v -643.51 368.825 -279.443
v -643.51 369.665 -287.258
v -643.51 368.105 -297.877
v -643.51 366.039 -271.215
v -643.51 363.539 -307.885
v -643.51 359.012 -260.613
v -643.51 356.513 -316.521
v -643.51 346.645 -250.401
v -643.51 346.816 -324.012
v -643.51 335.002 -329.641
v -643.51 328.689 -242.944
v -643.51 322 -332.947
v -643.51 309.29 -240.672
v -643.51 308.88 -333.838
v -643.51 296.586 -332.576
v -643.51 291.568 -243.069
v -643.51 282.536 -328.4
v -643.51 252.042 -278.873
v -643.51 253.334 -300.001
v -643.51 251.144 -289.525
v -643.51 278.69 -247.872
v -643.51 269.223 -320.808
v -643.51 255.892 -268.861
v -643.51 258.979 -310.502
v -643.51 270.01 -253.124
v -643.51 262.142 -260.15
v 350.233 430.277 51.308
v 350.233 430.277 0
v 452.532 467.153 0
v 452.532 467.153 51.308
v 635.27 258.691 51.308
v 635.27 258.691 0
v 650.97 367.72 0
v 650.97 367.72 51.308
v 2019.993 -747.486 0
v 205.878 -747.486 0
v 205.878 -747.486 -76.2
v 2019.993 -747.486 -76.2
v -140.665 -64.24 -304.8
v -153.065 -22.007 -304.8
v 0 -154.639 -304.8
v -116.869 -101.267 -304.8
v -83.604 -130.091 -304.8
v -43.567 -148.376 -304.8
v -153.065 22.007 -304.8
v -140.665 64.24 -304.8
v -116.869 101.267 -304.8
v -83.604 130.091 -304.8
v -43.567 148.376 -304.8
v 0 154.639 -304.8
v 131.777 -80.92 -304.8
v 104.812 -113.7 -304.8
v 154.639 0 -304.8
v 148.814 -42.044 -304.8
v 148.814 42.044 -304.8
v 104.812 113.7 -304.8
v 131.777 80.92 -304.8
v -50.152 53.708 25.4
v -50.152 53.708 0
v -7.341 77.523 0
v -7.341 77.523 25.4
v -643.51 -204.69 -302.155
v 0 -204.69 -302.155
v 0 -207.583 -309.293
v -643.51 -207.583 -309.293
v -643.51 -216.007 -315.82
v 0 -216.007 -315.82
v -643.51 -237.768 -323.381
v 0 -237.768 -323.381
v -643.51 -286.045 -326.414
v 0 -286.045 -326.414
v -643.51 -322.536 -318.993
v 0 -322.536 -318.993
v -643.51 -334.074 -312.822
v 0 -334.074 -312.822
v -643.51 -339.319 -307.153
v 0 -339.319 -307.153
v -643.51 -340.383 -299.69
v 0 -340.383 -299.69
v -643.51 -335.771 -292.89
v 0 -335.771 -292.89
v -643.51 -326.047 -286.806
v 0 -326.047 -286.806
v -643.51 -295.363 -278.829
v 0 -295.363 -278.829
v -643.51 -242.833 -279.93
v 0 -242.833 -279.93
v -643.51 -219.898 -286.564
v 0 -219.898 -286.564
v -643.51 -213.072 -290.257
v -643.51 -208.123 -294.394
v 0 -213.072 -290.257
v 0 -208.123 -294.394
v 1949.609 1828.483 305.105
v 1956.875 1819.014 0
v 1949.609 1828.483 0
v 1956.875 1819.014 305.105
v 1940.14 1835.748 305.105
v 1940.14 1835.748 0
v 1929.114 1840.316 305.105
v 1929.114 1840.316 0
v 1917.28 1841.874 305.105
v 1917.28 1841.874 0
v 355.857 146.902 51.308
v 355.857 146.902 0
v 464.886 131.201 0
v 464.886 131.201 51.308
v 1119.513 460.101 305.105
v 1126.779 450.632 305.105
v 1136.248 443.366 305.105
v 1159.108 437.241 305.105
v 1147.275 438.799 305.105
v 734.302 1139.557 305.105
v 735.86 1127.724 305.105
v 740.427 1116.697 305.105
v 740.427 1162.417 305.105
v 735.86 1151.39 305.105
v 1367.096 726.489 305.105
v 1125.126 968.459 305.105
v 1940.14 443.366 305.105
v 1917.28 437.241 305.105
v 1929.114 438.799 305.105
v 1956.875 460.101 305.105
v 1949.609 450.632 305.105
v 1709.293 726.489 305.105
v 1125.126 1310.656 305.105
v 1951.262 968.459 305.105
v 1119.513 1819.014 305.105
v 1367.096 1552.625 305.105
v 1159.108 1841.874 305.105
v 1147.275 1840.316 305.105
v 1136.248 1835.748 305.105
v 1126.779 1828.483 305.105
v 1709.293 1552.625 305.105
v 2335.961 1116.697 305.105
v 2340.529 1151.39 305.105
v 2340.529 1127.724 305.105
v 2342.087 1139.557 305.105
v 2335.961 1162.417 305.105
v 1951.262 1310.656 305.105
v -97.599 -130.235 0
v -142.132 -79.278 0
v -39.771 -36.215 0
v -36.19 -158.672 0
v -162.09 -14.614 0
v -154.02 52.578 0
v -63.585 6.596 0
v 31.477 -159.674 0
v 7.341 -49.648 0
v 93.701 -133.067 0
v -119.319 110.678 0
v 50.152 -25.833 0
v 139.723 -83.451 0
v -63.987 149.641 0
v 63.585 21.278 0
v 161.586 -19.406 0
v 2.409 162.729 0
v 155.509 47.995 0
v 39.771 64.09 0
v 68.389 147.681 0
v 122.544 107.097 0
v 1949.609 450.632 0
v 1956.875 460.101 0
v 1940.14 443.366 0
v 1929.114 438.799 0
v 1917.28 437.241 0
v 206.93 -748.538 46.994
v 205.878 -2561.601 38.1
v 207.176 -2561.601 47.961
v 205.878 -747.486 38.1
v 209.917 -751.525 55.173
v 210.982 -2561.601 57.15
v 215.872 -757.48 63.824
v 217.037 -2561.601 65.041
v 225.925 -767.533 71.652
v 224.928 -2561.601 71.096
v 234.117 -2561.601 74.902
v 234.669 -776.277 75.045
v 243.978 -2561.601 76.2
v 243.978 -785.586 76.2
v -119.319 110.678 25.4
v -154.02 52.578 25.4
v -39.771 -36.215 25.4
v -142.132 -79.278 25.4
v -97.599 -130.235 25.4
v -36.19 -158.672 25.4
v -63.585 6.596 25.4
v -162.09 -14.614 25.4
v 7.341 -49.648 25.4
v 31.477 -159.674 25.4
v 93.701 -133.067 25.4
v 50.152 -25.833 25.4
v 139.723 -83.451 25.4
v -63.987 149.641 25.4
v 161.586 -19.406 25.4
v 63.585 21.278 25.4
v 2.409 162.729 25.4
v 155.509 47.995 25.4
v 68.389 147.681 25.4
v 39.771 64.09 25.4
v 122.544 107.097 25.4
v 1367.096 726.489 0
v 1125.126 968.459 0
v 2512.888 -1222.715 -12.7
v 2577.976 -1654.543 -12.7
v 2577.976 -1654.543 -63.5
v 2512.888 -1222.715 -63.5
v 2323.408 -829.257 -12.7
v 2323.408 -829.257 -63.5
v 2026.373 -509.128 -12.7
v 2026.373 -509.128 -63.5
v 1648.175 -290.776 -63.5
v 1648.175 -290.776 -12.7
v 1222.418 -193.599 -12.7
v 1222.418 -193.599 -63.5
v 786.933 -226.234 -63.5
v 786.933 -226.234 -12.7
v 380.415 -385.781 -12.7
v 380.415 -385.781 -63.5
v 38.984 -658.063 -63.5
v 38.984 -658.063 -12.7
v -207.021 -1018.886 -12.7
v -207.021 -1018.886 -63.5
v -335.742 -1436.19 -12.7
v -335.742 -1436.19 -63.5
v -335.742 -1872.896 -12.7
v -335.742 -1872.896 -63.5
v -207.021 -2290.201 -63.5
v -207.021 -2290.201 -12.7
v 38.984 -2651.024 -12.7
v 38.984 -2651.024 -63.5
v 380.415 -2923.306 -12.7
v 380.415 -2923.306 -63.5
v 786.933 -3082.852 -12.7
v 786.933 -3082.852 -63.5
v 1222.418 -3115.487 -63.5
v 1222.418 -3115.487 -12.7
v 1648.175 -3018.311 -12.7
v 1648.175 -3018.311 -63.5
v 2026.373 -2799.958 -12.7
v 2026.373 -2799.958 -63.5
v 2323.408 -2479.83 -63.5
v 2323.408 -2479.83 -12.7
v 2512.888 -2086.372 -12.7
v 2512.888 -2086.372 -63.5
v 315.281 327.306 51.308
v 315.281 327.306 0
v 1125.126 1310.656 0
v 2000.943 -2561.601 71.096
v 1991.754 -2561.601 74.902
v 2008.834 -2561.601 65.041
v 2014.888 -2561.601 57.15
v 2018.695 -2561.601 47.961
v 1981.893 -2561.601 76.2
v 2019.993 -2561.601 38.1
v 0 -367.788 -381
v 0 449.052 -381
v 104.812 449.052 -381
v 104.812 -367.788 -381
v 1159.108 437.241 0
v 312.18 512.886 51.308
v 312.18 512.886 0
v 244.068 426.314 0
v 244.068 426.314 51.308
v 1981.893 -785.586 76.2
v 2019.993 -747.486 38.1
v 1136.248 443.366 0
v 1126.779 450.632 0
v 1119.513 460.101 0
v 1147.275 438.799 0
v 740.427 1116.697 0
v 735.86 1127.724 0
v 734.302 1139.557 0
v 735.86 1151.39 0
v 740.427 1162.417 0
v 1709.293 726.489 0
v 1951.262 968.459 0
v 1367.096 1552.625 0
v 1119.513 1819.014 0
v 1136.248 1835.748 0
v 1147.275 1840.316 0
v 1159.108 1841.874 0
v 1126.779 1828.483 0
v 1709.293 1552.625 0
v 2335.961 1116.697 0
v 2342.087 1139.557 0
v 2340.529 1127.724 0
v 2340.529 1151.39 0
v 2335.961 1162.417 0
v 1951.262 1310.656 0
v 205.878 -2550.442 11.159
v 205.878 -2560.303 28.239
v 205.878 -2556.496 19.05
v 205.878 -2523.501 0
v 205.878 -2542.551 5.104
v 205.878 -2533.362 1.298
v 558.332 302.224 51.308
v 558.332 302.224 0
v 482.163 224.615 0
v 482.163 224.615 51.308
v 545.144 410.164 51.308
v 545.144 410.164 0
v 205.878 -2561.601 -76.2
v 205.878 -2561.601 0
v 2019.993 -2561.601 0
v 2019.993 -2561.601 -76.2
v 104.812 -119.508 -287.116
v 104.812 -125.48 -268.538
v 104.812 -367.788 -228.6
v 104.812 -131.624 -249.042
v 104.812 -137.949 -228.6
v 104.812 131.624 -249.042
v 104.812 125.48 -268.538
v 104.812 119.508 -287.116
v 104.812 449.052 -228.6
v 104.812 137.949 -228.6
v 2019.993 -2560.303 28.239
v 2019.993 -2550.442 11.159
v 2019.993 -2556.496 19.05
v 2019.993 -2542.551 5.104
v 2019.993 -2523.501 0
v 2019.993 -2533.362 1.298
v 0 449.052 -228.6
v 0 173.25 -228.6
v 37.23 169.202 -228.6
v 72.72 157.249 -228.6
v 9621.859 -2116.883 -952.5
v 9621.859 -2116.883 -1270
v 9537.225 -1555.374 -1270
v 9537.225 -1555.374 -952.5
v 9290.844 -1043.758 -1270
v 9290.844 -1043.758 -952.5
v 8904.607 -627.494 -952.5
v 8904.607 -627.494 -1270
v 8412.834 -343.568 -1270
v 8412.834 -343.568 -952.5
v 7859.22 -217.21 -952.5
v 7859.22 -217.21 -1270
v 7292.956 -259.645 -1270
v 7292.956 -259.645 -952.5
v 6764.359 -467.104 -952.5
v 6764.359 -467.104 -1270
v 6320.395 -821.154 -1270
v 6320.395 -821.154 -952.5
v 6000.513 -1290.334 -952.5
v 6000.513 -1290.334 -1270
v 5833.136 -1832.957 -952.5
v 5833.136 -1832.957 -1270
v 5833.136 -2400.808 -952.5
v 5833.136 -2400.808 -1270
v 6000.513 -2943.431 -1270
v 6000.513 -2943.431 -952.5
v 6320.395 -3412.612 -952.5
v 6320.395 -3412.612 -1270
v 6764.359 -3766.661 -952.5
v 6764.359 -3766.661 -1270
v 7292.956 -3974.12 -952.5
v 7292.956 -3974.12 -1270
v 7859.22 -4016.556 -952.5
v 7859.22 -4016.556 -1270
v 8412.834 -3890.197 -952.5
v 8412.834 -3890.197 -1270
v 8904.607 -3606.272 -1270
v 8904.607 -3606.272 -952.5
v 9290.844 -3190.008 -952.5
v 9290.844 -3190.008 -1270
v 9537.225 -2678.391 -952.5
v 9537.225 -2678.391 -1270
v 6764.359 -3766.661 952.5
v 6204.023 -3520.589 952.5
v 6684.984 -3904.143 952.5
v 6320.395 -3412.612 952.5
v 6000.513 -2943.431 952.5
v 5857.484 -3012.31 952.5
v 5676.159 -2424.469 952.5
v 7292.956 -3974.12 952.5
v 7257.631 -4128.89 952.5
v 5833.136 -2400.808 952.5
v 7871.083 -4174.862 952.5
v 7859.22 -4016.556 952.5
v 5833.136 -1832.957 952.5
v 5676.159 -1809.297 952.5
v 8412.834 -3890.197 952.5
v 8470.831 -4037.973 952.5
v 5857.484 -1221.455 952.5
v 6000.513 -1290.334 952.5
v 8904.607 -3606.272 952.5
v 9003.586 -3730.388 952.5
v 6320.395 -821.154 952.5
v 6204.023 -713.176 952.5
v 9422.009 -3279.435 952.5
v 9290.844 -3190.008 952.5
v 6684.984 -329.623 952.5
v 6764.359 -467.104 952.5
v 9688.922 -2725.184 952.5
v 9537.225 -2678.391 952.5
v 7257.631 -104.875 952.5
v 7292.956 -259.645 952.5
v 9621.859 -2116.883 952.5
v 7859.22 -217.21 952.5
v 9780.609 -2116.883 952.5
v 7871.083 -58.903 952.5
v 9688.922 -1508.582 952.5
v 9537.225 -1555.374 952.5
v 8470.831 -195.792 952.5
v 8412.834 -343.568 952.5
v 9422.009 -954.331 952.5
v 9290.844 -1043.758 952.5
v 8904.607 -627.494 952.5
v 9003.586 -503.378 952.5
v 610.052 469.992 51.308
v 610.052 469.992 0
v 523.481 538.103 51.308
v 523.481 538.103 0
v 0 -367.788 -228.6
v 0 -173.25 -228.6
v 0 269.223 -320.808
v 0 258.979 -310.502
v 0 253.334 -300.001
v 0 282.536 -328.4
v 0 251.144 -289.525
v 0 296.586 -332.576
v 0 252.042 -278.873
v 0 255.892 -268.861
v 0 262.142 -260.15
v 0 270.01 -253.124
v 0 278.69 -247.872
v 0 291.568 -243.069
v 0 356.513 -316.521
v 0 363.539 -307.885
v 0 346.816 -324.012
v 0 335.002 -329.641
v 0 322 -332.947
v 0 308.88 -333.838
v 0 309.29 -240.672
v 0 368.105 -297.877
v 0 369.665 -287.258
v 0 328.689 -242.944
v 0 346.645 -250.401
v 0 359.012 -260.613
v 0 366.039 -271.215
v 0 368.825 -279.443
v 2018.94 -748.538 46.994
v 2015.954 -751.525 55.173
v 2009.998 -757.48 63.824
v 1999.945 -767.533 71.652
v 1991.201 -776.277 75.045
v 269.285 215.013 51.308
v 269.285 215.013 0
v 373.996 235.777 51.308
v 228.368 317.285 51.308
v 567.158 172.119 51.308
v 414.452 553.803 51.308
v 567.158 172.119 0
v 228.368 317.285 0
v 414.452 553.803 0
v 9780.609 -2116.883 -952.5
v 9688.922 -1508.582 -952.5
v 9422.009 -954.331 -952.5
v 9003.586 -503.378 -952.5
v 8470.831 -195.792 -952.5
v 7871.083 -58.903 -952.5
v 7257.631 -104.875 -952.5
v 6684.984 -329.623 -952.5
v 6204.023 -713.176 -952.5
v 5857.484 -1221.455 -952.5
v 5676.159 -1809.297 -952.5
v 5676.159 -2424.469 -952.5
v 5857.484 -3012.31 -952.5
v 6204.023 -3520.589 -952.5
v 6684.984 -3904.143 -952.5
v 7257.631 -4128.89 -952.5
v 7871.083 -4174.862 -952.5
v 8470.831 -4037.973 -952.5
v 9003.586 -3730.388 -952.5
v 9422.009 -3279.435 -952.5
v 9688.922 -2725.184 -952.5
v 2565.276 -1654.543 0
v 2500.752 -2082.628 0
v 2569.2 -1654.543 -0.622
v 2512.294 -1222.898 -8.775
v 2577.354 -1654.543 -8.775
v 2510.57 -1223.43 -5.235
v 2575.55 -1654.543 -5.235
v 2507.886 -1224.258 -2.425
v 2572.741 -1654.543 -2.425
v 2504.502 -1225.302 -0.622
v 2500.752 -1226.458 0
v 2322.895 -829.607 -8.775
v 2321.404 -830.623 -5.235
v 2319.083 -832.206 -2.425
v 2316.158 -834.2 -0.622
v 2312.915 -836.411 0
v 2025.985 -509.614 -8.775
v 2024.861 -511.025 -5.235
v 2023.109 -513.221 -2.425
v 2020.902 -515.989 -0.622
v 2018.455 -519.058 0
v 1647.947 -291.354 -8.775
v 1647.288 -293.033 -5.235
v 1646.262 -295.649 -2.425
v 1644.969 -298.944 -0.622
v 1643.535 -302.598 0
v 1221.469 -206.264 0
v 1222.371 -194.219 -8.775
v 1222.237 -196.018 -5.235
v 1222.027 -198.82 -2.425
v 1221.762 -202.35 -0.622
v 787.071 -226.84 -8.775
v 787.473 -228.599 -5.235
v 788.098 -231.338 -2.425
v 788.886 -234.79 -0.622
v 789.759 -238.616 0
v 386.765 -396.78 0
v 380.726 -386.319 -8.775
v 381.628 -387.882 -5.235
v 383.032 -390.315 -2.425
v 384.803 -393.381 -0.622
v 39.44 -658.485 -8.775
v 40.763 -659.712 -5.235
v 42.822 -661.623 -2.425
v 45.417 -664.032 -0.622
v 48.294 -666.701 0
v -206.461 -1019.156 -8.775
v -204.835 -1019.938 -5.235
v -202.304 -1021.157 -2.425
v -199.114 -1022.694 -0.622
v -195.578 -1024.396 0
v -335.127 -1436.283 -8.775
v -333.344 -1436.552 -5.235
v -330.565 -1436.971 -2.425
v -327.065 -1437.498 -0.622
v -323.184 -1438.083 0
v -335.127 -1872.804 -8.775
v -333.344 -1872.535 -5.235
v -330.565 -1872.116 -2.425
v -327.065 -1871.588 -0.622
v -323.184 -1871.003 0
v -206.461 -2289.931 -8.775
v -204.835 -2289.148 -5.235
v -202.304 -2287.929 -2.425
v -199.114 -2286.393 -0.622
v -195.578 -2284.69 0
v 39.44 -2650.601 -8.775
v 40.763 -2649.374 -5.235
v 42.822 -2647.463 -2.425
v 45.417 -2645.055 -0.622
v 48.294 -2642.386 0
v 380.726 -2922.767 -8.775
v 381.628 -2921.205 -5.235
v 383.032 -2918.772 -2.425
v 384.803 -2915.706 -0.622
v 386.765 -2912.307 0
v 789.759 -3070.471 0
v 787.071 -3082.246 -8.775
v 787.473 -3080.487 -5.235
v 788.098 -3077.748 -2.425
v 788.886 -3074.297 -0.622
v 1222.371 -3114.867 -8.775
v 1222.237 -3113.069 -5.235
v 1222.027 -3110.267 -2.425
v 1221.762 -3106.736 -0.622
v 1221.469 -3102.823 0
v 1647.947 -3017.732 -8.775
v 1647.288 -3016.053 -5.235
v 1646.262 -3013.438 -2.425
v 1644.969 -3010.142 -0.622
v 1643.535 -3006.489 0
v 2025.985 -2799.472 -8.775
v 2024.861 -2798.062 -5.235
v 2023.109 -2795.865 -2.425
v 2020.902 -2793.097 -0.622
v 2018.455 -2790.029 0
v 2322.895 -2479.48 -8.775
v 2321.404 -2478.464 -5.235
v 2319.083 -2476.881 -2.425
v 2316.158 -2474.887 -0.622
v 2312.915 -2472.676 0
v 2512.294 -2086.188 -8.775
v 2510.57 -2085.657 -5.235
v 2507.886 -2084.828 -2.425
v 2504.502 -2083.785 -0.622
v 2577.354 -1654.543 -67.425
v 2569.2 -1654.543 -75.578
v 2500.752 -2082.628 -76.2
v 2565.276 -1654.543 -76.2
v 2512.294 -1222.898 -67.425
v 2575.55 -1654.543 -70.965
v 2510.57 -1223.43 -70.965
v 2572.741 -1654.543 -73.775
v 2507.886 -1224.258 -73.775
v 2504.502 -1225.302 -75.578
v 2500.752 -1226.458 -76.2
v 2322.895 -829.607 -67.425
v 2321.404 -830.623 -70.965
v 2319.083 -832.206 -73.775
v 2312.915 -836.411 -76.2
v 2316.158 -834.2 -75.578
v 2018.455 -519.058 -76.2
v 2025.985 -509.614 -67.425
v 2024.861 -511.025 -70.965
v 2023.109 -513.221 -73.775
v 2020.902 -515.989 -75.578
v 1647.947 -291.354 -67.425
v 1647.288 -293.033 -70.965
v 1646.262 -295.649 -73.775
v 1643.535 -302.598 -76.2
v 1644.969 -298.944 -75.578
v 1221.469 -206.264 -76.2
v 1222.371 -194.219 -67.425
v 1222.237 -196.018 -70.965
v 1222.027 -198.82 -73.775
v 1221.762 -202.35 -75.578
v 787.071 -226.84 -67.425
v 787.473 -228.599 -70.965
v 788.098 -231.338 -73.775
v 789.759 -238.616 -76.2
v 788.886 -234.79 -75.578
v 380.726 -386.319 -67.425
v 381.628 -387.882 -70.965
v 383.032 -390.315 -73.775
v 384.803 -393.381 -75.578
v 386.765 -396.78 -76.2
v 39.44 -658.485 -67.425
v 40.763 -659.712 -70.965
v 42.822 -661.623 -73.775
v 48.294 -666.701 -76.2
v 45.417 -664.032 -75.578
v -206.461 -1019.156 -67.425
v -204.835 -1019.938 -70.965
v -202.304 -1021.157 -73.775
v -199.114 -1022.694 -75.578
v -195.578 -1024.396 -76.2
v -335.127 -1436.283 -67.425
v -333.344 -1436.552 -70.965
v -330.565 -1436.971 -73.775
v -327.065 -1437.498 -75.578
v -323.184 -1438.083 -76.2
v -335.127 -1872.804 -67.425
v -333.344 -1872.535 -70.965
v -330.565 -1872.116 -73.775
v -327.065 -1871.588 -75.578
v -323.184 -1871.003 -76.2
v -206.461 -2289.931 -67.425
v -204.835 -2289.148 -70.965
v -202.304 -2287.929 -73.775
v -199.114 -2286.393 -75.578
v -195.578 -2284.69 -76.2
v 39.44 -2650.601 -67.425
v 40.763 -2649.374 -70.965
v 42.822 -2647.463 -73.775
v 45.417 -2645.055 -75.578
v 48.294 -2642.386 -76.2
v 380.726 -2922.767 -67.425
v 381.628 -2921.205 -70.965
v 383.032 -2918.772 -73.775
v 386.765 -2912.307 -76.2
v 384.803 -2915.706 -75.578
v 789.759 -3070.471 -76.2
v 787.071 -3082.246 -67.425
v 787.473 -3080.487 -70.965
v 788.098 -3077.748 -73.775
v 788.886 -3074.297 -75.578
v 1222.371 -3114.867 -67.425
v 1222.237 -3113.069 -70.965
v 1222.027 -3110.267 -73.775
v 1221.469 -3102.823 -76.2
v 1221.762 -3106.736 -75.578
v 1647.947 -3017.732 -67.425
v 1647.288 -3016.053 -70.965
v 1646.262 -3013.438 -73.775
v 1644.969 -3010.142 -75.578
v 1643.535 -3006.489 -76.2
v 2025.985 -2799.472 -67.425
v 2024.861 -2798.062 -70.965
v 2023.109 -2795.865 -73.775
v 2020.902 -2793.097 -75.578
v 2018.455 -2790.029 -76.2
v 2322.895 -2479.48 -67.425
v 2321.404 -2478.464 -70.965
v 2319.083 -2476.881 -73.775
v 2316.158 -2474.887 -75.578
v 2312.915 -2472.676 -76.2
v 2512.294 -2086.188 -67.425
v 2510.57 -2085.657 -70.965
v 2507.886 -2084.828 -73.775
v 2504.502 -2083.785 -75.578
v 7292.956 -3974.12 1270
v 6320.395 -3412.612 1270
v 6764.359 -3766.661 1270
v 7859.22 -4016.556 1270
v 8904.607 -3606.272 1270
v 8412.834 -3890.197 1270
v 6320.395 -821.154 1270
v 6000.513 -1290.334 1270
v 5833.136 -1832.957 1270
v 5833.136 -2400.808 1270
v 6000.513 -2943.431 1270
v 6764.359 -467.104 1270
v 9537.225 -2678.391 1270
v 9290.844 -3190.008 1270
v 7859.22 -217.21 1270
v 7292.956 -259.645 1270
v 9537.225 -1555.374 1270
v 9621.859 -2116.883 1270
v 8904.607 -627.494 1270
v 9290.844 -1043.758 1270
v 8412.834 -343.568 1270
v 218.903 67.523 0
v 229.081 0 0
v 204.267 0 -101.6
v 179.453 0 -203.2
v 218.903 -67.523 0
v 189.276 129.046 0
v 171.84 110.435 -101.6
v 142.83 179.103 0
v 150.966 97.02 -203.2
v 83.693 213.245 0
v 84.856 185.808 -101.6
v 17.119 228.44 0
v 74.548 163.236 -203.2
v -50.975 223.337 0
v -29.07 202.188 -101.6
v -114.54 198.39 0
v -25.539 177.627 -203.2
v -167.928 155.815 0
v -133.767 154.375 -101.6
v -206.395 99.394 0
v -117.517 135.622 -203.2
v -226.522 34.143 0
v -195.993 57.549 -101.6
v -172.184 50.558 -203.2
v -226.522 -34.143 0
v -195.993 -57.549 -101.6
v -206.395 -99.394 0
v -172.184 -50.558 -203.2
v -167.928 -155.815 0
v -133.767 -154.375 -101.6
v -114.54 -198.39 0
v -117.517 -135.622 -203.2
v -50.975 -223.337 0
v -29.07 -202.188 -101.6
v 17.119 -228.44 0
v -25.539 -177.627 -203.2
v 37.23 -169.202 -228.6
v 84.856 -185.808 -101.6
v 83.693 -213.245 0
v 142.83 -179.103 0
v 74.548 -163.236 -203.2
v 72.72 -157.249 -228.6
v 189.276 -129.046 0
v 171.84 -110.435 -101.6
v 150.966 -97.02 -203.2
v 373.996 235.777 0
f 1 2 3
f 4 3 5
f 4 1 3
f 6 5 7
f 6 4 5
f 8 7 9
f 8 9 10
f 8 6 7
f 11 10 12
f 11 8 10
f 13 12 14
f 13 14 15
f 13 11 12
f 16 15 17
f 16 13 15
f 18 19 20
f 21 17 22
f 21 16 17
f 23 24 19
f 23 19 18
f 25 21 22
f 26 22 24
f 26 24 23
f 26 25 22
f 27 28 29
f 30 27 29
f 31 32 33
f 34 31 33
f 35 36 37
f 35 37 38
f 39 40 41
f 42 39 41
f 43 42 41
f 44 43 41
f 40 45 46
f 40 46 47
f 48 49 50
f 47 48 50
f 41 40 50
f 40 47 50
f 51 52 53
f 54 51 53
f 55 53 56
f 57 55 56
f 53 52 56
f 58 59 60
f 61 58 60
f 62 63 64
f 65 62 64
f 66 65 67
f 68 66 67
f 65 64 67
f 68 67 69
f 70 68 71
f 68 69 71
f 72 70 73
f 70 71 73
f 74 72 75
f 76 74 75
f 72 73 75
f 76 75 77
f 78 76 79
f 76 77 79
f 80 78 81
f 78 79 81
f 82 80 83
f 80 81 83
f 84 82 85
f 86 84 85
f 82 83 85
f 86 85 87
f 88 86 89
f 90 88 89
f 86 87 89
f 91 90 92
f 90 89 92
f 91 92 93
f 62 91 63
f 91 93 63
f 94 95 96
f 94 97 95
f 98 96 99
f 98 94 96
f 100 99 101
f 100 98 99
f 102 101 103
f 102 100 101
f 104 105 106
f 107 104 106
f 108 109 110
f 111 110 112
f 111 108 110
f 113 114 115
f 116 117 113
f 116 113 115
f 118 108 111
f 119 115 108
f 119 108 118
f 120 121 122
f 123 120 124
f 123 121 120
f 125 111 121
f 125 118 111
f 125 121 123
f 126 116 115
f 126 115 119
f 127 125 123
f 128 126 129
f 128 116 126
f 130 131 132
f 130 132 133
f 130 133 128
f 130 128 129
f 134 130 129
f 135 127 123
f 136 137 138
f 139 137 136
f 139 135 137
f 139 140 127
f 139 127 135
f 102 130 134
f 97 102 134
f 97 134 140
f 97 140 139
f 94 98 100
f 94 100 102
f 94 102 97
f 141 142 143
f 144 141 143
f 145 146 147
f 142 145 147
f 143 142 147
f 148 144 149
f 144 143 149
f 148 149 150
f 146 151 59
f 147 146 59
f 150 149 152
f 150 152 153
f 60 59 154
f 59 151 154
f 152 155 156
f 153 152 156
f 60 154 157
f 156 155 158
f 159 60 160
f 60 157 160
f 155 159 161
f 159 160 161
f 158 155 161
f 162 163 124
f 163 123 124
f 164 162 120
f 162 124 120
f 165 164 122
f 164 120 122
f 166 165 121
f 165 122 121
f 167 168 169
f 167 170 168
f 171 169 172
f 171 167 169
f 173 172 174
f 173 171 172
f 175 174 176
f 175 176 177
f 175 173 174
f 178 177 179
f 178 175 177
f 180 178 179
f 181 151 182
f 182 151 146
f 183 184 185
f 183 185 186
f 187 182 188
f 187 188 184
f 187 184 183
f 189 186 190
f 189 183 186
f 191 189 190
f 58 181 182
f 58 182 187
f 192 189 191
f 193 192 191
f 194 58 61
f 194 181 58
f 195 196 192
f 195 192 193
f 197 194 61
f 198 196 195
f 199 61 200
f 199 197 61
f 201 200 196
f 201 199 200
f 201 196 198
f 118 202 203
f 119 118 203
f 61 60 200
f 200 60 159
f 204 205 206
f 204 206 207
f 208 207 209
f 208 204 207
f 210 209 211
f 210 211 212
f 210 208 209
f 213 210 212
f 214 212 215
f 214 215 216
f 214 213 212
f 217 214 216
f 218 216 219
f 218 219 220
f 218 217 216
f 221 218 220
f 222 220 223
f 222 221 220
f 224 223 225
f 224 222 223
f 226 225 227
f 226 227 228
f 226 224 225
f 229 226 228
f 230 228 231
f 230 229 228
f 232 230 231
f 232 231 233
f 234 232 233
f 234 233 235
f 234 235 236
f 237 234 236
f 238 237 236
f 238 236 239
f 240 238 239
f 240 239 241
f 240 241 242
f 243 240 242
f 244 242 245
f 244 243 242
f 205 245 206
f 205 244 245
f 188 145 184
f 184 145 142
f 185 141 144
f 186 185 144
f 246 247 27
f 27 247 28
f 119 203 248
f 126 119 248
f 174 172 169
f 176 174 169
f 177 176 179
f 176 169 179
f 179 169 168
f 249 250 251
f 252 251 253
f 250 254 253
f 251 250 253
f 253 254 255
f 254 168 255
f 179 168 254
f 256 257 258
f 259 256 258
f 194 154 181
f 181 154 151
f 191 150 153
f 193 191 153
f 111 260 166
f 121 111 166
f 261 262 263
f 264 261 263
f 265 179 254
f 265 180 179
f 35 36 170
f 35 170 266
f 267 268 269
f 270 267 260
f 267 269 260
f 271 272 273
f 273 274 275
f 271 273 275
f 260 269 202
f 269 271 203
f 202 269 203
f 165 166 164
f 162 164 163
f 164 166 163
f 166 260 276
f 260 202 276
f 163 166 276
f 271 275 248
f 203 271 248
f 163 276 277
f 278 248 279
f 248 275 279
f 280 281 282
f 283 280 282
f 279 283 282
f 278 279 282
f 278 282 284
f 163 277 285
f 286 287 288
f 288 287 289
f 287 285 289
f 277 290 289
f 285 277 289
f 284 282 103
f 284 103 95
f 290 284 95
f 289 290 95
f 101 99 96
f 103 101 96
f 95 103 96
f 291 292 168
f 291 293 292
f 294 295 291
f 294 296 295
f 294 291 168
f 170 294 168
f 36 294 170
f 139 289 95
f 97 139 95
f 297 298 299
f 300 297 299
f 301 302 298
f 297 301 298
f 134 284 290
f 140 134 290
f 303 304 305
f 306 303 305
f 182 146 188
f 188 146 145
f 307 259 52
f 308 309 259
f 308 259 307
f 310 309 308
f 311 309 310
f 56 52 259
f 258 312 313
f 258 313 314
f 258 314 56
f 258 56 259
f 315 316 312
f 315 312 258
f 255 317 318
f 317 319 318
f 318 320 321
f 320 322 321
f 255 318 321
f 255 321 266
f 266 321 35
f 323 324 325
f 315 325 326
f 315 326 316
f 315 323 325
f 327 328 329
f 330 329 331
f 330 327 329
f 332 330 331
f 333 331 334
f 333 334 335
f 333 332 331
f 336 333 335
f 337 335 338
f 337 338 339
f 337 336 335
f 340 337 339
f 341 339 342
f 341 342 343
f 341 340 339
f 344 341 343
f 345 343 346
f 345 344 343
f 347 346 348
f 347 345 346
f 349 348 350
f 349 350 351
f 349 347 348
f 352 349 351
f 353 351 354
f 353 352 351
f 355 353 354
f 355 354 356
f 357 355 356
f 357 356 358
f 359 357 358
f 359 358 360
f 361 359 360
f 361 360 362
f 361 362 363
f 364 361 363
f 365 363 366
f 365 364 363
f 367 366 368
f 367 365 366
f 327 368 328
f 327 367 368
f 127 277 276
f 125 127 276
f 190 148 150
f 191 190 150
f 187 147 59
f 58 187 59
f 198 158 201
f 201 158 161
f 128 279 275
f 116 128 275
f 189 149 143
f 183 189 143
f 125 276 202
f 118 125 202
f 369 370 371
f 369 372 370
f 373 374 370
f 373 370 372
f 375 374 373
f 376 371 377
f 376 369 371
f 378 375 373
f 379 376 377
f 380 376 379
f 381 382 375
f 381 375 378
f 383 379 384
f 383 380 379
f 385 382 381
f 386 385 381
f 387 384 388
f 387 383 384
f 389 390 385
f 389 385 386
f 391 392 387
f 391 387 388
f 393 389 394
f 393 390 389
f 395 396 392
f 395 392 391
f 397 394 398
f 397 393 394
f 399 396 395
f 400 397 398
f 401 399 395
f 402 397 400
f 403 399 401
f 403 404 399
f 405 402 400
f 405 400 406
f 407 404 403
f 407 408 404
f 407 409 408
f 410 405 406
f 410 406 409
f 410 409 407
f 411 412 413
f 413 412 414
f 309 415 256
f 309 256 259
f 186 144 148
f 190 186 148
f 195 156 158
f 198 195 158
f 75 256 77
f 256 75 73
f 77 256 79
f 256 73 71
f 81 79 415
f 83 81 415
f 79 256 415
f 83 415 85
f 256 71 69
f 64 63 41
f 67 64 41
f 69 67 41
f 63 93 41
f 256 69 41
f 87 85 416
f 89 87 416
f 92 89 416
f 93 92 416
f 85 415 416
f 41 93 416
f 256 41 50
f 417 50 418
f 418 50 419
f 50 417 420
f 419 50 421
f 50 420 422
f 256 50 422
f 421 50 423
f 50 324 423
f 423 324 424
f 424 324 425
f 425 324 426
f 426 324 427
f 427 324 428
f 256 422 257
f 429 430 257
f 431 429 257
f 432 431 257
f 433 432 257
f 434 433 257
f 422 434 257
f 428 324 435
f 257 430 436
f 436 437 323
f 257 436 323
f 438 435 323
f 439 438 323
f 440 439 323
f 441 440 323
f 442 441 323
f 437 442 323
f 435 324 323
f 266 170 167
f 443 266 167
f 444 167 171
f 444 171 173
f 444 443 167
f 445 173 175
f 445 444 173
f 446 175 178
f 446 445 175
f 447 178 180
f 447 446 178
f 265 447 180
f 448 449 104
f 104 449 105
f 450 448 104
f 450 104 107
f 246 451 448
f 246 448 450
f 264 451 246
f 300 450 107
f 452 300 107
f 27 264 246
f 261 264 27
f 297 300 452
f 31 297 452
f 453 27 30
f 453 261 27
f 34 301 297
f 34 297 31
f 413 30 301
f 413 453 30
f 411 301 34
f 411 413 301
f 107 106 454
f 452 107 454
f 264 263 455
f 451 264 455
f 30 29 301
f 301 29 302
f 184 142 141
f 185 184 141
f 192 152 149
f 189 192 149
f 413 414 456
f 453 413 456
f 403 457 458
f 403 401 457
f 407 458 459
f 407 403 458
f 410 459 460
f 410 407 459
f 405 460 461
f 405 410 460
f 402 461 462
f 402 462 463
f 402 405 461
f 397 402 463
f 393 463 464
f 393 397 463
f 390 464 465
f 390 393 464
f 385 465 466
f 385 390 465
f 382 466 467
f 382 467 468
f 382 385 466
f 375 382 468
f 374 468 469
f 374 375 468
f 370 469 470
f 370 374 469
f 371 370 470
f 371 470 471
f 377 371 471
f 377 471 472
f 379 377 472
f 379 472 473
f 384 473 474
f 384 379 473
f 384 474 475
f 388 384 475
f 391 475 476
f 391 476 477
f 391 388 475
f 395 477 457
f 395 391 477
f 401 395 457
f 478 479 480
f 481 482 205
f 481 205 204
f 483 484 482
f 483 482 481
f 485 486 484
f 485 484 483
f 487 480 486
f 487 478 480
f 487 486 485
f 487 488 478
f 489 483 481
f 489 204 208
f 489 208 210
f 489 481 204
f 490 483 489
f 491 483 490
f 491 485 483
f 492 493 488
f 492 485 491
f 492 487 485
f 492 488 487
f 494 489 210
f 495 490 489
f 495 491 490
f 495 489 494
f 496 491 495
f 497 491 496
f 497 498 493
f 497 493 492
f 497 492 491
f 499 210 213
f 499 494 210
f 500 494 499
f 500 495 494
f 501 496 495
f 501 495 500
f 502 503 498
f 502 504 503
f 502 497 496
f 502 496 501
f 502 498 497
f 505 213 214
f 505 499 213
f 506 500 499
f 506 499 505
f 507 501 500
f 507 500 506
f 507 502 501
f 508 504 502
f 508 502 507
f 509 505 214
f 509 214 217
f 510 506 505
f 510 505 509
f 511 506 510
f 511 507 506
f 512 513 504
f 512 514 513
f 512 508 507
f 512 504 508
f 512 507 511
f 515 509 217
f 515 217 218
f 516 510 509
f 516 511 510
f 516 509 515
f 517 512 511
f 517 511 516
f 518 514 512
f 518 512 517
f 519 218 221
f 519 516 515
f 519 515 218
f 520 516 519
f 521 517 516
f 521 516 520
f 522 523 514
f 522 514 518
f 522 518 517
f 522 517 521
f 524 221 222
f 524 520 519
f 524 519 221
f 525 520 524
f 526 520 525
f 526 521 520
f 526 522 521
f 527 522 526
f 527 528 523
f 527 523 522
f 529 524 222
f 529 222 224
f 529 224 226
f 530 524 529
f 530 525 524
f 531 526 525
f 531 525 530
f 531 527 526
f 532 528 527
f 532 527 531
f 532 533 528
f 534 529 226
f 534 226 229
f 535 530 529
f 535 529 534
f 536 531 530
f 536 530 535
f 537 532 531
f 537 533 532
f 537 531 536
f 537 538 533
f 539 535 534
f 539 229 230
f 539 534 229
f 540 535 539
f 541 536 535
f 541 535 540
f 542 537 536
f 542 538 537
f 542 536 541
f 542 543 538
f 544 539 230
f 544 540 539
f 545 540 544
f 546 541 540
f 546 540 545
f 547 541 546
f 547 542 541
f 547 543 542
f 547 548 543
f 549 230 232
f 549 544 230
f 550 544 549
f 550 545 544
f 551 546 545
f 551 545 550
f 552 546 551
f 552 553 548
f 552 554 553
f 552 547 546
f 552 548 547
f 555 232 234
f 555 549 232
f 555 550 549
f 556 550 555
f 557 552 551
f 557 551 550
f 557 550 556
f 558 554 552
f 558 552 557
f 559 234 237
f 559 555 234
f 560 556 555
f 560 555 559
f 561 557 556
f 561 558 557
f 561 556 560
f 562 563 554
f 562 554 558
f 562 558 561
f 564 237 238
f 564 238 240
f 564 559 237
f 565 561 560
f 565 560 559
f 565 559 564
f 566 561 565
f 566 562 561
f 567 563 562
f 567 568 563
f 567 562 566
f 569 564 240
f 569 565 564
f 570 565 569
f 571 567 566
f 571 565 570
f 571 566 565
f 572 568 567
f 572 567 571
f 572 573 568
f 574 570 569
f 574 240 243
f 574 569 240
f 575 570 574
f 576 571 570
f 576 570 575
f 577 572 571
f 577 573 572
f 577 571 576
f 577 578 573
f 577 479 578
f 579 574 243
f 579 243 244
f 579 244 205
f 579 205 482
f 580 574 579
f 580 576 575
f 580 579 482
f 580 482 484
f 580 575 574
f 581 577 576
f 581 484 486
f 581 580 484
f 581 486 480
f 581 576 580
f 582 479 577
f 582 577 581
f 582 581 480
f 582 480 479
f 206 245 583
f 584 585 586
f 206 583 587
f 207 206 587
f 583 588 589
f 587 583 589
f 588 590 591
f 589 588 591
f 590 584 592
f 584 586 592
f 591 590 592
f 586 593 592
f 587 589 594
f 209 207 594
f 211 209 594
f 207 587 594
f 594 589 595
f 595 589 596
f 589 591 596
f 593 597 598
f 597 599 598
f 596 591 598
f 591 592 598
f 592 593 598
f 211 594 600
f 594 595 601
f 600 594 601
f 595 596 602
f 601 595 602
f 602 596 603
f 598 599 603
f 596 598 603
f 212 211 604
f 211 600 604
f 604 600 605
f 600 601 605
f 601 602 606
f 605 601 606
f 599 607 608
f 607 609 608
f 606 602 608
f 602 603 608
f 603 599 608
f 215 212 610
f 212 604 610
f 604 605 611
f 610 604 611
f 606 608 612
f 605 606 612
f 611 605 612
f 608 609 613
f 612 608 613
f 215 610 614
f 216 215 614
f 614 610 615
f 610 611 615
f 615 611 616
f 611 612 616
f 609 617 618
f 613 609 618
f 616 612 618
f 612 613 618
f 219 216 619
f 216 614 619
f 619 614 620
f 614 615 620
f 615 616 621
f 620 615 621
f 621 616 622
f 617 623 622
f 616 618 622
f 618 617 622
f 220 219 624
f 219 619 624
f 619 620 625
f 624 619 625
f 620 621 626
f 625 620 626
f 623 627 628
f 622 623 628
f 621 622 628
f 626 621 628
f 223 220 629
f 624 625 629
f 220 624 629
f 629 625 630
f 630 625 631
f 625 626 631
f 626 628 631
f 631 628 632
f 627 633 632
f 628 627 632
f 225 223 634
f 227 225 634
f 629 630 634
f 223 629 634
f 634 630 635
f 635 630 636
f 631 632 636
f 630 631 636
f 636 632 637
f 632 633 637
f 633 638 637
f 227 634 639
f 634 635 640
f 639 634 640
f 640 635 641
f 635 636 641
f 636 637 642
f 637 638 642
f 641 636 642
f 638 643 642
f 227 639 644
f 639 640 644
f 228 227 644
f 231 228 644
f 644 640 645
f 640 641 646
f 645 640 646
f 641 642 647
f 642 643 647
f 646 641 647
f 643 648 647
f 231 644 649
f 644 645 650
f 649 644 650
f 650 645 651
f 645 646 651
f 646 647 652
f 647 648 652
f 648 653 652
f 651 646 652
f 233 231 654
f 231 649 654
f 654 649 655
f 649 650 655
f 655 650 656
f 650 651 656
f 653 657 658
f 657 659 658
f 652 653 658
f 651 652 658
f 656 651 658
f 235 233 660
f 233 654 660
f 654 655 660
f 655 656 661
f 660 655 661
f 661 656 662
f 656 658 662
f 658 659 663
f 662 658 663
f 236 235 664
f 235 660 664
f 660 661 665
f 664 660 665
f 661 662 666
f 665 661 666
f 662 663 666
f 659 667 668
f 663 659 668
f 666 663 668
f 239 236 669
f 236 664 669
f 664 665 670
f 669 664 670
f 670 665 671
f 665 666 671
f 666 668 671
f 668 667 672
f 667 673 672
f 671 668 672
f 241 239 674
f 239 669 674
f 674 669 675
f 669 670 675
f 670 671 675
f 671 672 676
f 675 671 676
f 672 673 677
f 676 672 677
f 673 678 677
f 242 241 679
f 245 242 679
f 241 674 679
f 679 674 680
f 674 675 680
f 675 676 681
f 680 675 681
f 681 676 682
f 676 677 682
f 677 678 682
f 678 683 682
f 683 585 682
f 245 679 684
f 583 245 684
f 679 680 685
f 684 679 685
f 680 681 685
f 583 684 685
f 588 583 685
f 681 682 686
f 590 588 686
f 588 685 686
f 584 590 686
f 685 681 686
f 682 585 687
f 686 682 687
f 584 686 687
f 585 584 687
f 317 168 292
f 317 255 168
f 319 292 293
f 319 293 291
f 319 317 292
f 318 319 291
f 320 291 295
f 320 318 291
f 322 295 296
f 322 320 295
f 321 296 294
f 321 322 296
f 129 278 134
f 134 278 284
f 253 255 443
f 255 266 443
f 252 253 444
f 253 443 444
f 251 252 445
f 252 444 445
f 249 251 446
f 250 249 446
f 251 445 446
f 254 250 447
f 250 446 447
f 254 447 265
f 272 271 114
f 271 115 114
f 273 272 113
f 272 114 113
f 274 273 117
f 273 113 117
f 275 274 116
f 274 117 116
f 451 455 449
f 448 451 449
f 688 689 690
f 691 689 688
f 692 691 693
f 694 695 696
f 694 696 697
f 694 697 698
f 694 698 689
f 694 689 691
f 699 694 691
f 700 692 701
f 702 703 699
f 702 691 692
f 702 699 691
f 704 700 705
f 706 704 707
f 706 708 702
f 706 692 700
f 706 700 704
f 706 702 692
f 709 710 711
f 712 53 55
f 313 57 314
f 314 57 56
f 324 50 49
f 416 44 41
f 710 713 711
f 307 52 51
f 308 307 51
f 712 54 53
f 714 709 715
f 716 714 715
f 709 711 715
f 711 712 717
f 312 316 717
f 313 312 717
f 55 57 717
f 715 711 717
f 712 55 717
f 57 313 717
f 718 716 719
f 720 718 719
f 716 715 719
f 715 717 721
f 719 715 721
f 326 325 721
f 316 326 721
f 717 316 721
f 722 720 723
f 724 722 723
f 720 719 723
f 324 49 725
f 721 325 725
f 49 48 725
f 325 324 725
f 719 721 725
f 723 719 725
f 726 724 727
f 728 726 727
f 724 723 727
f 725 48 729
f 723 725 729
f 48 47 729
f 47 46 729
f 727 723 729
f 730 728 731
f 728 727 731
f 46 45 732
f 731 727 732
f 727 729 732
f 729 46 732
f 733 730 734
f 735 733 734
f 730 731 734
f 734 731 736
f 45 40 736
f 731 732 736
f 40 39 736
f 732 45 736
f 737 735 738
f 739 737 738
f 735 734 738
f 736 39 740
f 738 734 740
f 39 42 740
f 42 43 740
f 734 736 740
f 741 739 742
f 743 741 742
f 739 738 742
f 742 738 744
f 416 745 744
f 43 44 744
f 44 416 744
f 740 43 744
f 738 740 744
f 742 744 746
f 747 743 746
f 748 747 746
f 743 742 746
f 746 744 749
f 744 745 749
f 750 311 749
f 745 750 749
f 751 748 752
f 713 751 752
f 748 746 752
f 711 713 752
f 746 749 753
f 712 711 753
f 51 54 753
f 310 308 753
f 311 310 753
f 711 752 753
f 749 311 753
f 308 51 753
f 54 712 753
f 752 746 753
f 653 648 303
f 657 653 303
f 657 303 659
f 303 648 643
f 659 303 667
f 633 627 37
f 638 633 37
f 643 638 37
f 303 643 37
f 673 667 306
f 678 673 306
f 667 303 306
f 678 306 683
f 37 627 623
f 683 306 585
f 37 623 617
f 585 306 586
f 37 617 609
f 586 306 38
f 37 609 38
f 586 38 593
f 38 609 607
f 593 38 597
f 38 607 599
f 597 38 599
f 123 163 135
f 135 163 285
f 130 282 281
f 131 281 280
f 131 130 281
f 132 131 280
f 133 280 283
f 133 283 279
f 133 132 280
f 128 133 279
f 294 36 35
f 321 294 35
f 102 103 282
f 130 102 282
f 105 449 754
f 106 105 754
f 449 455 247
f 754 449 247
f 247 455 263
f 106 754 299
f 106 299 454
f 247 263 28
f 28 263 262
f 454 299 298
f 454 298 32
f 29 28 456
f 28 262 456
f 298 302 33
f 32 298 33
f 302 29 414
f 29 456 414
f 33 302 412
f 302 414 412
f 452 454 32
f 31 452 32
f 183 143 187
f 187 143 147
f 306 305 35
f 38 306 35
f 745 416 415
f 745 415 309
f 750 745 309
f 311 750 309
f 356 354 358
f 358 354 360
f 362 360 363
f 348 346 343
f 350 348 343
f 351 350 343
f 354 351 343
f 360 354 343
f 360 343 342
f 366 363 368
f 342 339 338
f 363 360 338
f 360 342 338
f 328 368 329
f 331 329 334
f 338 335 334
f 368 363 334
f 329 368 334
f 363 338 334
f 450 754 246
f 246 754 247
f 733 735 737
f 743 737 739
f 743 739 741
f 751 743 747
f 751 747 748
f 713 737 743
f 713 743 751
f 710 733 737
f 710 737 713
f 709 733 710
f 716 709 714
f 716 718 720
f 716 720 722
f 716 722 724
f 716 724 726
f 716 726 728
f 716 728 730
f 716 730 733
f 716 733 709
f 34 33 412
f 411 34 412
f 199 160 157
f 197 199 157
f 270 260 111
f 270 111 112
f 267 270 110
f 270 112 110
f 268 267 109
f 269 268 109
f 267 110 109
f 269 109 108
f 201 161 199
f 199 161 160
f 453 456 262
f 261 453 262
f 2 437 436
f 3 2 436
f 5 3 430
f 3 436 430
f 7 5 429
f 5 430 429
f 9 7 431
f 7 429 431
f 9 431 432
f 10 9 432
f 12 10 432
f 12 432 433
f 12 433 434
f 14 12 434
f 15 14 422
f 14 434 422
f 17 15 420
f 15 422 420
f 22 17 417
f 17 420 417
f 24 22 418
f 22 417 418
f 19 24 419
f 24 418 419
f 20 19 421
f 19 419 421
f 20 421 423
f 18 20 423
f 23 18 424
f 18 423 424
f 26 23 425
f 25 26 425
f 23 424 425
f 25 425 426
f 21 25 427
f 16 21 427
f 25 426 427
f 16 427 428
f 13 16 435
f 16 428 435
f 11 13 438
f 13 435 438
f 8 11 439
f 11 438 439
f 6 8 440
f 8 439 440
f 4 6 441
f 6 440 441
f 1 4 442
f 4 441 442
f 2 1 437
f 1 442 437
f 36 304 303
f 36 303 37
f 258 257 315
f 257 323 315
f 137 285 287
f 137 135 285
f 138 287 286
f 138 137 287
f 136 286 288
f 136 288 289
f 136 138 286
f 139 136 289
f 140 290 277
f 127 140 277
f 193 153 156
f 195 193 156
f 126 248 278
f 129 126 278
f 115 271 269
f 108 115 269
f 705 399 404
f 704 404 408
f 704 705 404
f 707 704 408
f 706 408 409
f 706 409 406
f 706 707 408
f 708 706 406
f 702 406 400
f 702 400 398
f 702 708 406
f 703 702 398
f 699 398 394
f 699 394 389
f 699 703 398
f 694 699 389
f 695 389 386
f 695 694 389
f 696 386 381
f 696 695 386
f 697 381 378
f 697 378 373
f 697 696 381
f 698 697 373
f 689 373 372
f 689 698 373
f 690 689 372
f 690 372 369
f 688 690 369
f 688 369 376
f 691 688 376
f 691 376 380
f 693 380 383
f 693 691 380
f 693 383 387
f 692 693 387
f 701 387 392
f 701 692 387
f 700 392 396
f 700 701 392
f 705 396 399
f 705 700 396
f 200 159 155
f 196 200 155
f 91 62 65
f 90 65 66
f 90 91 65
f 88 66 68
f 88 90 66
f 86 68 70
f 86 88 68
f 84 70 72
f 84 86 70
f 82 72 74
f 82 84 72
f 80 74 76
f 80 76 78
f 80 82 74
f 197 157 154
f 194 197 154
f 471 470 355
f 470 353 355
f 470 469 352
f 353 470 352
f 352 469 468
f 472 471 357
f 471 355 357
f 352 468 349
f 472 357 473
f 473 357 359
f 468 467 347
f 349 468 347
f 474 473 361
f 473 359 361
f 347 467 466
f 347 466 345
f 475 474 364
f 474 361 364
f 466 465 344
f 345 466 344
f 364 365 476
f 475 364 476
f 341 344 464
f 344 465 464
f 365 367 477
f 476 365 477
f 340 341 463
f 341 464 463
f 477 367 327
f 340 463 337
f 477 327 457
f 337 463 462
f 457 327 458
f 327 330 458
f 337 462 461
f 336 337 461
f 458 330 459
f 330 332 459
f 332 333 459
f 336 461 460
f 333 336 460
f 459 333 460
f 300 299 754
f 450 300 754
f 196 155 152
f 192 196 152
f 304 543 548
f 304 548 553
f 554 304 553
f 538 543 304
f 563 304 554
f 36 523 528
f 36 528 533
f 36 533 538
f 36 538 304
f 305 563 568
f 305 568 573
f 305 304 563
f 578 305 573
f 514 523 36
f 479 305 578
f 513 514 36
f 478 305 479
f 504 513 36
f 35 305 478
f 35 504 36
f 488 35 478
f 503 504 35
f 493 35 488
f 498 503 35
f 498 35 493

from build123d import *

# Parameters (mm, degrees)
F1_DEPTH  = 25.4
F3_DEPTH  = 51.308
F5_DEPTH  = 305.1048
F6_R      = 45.72
F7_R      = 1465.0405111475
F7_W      = 1814.1152858734
F7_H      = 1814.1152858734
F8_DEPTH  = 76.2
F9_DEPTH  = 76.2
F10_R     = 38.09999
F11_R     = 12.7
F12_R     = 1905
F13_DEPTH = 1270
F12_R_2   = 2063.75
F14_DEPTH = 952.5
F19_R     = 229.0809109199
F21_R     = 154.6394893279
F23_W     = 104.8123165965
F23_H     = 816.8393224478
F24_DEPTH = 76.2
F26_DEPTH = 643.5099393129


# Not quite as in the source:
# - a fillet or chamfer is up to 0.001 mm smaller than in the source, because OpenCascade refuses the exact size
# - the program builds the solid bodies; features that only make, move or delete a surface that nothing else refers to are left out


with BuildPart() as f1:
    # F0 (on Top) → F1 (new body)
    with BuildSketch(Plane.XY):
        Polygon((155.50936864, 47.9948012801), (122.5436329842, 107.0967912674), (68.3889899114, 147.6807731007), (2.4092691885, 162.7294076272), (-63.9870360646, 149.6406492247), (-119.3194014782, 110.6776631286), (-154.0203583934, 52.5775036026), (-162.0897961115, -14.6137839479), (-142.1324355422, -79.2782154918), (-97.5990856351, -130.2347233572), (-36.1899671618, -158.6724644088), (31.4767254093, -159.67429487), (93.7008062, -133.0669891528), (139.7231663537, -83.4511921354), (161.5861216997, -19.4059258675), align=None)
        Polygon((39.7706934855, 64.0896567419), (63.5851919651, 21.2782472372), (50.1523473576, -25.8333841012), (7.3409378529, -49.6478825808), (-39.7706934855, -36.2150379733), (-63.5851919651, 6.5963715315), (-50.1523473576, 53.7080028699), (-7.3409378529, 77.5225013494), align=None, mode=Mode.SUBTRACT)
    extrude(amount=F1_DEPTH)


with BuildPart() as f3:
    # F2 (on Top) → F3 (new body)
    with BuildSketch(Plane.XY):
        Polygon((567.1581641405, 172.1189159194), (635.2695226669, 258.6906254292), (650.9698346822, 367.7196043769), (610.052214261, 469.9916259019), (523.4805047512, 538.1029844284), (414.4515258035, 553.8032964437), (312.1795042784, 512.8856760224), (244.068145752, 426.3139665127), (228.3678337366, 317.284987565), (269.2854541579, 215.0129660399), (355.8571636677, 146.9016075134), (464.8861426154, 131.2012954981), align=None)
        Polygon((545.1443835194, 410.1638138472), (558.3316683769, 302.2244572639), (482.1634188256, 224.6151347452), (373.9958803268, 235.7772490893), (315.2814155857, 327.3055005294), (350.2332141092, 430.2772488952), (452.5318587224, 467.1526674262), align=None, mode=Mode.SUBTRACT)
    extrude(amount=F3_DEPTH)


with BuildPart() as f5:
    # F4 (on Top) → F5 (new body)
    with BuildSketch(Plane.XY):
        Polygon((1943.6769121667, 437.2407213386), (2349.1595144473, 1139.5571900737), (1943.6769121667, 1841.8736588088), (1132.7117076057, 1841.8736588088), (727.2291053252, 1139.5571900737), (1132.7117076057, 437.2407213386), align=None)
        Polygon((1709.2926557119, 1552.6251370658), (1951.2622568783, 1310.6555358994), (1951.2622568783, 968.458844248), (1709.2926557119, 726.4892430816), (1367.0959640605, 726.4892430816), (1125.1263628941, 968.458844248), (1125.1263628941, 1310.6555358994), (1367.0959640605, 1552.6251370658), align=None, mode=Mode.SUBTRACT)
    extrude(amount=F5_DEPTH)

    # F6
    f6_edges = [f5.edges().sort_by_distance(p)[0] for p in [
        (1943.676912, 437.240721, 152.5524),
        (2349.159514, 1139.55719, 152.5524),
        (1943.676912, 1841.873659, 152.5524),
        (1132.711708, 1841.873659, 152.5524),
        (727.229105, 1139.55719, 152.5524),
        (1132.711708, 437.240721, 152.5524),
    ]]
    fillet(f6_edges, radius=F6_R)


with BuildPart() as f8:
    # F7 (on Top) → F8 (new body)
    with BuildSketch(Plane.XY):
        with Locations((1112.9351854324, -1654.5432806015)):
            Circle(F7_R)
        with Locations((1112.9351854324, -1654.5432806015)):
            Rectangle(F7_W, F7_H, mode=Mode.SUBTRACT)
    extrude(amount=-F8_DEPTH)

    # F11
    f11_edges = [f8.edges().sort_by_distance(p)[0] for p in [
        (-352.105326, -1654.543281, 0),
        (-352.105326, -1654.543281, -76.2),
    ]]
    fillet(f11_edges, radius=F11_R)


with BuildPart() as f9:
    # F7 (on Top) → F9 (new body)
    with BuildSketch(Plane.XY):
        with Locations((1112.9351854324, -1654.5432806015)):
            Rectangle(F7_W, F7_H)
    extrude(amount=F9_DEPTH)

    # F10 (radius 38.1 in the source; OpenCascade refuses exactly that, so slightly less here)
    f10_edges = [f9.edges().sort_by_distance(p)[0] for p in [
        (205.877542, -1654.543281, 76.2),
        (2019.992828, -1654.543281, 76.2),
        (1112.935185, -2561.600924, 0),
        (1112.935185, -747.485638, 76.2),
    ]]
    fillet(f10_edges, radius=F10_R)


with BuildPart() as f13:
    # F12 (on Top) → F13 (new body, symmetric)
    with BuildSketch(Plane.XY):
        with Locations((7716.8588638306, -2116.8828010559)):
            Circle(F12_R)
    extrude(amount=F13_DEPTH, both=True)

    # F12 (on Top) → F14 (join, symmetric)
    with BuildSketch(Plane.XY):
        with Locations((7716.8588638306, -2116.8828010559)):
            Circle(F12_R_2)
        with Locations((7716.8588638306, -2116.8828010559)):
            Circle(F12_R, mode=Mode.SUBTRACT)
    extrude(amount=F14_DEPTH, both=True)


with BuildPart() as f22:
    # F19 (on Top) → F22 section 0
    with BuildSketch(Plane.XY):
        Circle(F19_R)
    # F21 (on offset) → F22 section 1
    with BuildSketch(Plane.XY.offset(-304.8)):
        Circle(F21_R)
    loft()

    # F23 (on offset) → F24 (join, symmetric)
    with BuildSketch(Plane.XY.offset(-304.8)):
        with Locations((52.4061582983, 40.6319275498)):
            Rectangle(F23_W, F23_H)
    extrude(amount=F24_DEPTH, both=True)

    # F25 (on face) → F26 (join)
    with BuildSketch(Plane(origin=(0, 0, 0), x_dir=(0, -1, 0), z_dir=(-1, 0, 0))):
        with BuildLine():
            add(Edge.make_bspline(
                [(204.6898007393, -302.1550476551), (204.6898007393, -345.0046976312), (306.7133426666, -323.5798726431), (408.736884594, -302.1550476551), (306.7133426666, -280.7302226671), (204.6898007393, -259.305397679), (204.6898007393, -302.1550476551)],
                knots=[0, 0, 0, 2.0943951024, 2.0943951024, 4.1887902048, 4.1887902048, 6.2831853072, 6.2831853072, 6.2831853072], degree=2, weights=[1, 0.5, 1, 0.5, 1, 0.5, 1]))
        make_face()
        with BuildLine():
            add(Edge.make_bspline(
                [(-369.6652650833, -287.2584462166), (-369.6652650833, -367.9612465382), (-280.7216048241, -327.6098463774), (-191.7779445648, -287.2584462166), (-280.7216048241, -246.9070460558), (-369.6652650833, -206.555645895), (-369.6652650833, -287.2584462166)],
                knots=[0, 0, 0, 2.0943951024, 2.0943951024, 4.1887902048, 4.1887902048, 6.2831853072, 6.2831853072, 6.2831853072], degree=2, weights=[1, 0.5, 1, 0.5, 1, 0.5, 1]))
        make_face()
    extrude(amount=F26_DEPTH)


solid = Compound([f1.part, f3.part, f5.part, f8.part, f9.part, f13.part, f22.part])
